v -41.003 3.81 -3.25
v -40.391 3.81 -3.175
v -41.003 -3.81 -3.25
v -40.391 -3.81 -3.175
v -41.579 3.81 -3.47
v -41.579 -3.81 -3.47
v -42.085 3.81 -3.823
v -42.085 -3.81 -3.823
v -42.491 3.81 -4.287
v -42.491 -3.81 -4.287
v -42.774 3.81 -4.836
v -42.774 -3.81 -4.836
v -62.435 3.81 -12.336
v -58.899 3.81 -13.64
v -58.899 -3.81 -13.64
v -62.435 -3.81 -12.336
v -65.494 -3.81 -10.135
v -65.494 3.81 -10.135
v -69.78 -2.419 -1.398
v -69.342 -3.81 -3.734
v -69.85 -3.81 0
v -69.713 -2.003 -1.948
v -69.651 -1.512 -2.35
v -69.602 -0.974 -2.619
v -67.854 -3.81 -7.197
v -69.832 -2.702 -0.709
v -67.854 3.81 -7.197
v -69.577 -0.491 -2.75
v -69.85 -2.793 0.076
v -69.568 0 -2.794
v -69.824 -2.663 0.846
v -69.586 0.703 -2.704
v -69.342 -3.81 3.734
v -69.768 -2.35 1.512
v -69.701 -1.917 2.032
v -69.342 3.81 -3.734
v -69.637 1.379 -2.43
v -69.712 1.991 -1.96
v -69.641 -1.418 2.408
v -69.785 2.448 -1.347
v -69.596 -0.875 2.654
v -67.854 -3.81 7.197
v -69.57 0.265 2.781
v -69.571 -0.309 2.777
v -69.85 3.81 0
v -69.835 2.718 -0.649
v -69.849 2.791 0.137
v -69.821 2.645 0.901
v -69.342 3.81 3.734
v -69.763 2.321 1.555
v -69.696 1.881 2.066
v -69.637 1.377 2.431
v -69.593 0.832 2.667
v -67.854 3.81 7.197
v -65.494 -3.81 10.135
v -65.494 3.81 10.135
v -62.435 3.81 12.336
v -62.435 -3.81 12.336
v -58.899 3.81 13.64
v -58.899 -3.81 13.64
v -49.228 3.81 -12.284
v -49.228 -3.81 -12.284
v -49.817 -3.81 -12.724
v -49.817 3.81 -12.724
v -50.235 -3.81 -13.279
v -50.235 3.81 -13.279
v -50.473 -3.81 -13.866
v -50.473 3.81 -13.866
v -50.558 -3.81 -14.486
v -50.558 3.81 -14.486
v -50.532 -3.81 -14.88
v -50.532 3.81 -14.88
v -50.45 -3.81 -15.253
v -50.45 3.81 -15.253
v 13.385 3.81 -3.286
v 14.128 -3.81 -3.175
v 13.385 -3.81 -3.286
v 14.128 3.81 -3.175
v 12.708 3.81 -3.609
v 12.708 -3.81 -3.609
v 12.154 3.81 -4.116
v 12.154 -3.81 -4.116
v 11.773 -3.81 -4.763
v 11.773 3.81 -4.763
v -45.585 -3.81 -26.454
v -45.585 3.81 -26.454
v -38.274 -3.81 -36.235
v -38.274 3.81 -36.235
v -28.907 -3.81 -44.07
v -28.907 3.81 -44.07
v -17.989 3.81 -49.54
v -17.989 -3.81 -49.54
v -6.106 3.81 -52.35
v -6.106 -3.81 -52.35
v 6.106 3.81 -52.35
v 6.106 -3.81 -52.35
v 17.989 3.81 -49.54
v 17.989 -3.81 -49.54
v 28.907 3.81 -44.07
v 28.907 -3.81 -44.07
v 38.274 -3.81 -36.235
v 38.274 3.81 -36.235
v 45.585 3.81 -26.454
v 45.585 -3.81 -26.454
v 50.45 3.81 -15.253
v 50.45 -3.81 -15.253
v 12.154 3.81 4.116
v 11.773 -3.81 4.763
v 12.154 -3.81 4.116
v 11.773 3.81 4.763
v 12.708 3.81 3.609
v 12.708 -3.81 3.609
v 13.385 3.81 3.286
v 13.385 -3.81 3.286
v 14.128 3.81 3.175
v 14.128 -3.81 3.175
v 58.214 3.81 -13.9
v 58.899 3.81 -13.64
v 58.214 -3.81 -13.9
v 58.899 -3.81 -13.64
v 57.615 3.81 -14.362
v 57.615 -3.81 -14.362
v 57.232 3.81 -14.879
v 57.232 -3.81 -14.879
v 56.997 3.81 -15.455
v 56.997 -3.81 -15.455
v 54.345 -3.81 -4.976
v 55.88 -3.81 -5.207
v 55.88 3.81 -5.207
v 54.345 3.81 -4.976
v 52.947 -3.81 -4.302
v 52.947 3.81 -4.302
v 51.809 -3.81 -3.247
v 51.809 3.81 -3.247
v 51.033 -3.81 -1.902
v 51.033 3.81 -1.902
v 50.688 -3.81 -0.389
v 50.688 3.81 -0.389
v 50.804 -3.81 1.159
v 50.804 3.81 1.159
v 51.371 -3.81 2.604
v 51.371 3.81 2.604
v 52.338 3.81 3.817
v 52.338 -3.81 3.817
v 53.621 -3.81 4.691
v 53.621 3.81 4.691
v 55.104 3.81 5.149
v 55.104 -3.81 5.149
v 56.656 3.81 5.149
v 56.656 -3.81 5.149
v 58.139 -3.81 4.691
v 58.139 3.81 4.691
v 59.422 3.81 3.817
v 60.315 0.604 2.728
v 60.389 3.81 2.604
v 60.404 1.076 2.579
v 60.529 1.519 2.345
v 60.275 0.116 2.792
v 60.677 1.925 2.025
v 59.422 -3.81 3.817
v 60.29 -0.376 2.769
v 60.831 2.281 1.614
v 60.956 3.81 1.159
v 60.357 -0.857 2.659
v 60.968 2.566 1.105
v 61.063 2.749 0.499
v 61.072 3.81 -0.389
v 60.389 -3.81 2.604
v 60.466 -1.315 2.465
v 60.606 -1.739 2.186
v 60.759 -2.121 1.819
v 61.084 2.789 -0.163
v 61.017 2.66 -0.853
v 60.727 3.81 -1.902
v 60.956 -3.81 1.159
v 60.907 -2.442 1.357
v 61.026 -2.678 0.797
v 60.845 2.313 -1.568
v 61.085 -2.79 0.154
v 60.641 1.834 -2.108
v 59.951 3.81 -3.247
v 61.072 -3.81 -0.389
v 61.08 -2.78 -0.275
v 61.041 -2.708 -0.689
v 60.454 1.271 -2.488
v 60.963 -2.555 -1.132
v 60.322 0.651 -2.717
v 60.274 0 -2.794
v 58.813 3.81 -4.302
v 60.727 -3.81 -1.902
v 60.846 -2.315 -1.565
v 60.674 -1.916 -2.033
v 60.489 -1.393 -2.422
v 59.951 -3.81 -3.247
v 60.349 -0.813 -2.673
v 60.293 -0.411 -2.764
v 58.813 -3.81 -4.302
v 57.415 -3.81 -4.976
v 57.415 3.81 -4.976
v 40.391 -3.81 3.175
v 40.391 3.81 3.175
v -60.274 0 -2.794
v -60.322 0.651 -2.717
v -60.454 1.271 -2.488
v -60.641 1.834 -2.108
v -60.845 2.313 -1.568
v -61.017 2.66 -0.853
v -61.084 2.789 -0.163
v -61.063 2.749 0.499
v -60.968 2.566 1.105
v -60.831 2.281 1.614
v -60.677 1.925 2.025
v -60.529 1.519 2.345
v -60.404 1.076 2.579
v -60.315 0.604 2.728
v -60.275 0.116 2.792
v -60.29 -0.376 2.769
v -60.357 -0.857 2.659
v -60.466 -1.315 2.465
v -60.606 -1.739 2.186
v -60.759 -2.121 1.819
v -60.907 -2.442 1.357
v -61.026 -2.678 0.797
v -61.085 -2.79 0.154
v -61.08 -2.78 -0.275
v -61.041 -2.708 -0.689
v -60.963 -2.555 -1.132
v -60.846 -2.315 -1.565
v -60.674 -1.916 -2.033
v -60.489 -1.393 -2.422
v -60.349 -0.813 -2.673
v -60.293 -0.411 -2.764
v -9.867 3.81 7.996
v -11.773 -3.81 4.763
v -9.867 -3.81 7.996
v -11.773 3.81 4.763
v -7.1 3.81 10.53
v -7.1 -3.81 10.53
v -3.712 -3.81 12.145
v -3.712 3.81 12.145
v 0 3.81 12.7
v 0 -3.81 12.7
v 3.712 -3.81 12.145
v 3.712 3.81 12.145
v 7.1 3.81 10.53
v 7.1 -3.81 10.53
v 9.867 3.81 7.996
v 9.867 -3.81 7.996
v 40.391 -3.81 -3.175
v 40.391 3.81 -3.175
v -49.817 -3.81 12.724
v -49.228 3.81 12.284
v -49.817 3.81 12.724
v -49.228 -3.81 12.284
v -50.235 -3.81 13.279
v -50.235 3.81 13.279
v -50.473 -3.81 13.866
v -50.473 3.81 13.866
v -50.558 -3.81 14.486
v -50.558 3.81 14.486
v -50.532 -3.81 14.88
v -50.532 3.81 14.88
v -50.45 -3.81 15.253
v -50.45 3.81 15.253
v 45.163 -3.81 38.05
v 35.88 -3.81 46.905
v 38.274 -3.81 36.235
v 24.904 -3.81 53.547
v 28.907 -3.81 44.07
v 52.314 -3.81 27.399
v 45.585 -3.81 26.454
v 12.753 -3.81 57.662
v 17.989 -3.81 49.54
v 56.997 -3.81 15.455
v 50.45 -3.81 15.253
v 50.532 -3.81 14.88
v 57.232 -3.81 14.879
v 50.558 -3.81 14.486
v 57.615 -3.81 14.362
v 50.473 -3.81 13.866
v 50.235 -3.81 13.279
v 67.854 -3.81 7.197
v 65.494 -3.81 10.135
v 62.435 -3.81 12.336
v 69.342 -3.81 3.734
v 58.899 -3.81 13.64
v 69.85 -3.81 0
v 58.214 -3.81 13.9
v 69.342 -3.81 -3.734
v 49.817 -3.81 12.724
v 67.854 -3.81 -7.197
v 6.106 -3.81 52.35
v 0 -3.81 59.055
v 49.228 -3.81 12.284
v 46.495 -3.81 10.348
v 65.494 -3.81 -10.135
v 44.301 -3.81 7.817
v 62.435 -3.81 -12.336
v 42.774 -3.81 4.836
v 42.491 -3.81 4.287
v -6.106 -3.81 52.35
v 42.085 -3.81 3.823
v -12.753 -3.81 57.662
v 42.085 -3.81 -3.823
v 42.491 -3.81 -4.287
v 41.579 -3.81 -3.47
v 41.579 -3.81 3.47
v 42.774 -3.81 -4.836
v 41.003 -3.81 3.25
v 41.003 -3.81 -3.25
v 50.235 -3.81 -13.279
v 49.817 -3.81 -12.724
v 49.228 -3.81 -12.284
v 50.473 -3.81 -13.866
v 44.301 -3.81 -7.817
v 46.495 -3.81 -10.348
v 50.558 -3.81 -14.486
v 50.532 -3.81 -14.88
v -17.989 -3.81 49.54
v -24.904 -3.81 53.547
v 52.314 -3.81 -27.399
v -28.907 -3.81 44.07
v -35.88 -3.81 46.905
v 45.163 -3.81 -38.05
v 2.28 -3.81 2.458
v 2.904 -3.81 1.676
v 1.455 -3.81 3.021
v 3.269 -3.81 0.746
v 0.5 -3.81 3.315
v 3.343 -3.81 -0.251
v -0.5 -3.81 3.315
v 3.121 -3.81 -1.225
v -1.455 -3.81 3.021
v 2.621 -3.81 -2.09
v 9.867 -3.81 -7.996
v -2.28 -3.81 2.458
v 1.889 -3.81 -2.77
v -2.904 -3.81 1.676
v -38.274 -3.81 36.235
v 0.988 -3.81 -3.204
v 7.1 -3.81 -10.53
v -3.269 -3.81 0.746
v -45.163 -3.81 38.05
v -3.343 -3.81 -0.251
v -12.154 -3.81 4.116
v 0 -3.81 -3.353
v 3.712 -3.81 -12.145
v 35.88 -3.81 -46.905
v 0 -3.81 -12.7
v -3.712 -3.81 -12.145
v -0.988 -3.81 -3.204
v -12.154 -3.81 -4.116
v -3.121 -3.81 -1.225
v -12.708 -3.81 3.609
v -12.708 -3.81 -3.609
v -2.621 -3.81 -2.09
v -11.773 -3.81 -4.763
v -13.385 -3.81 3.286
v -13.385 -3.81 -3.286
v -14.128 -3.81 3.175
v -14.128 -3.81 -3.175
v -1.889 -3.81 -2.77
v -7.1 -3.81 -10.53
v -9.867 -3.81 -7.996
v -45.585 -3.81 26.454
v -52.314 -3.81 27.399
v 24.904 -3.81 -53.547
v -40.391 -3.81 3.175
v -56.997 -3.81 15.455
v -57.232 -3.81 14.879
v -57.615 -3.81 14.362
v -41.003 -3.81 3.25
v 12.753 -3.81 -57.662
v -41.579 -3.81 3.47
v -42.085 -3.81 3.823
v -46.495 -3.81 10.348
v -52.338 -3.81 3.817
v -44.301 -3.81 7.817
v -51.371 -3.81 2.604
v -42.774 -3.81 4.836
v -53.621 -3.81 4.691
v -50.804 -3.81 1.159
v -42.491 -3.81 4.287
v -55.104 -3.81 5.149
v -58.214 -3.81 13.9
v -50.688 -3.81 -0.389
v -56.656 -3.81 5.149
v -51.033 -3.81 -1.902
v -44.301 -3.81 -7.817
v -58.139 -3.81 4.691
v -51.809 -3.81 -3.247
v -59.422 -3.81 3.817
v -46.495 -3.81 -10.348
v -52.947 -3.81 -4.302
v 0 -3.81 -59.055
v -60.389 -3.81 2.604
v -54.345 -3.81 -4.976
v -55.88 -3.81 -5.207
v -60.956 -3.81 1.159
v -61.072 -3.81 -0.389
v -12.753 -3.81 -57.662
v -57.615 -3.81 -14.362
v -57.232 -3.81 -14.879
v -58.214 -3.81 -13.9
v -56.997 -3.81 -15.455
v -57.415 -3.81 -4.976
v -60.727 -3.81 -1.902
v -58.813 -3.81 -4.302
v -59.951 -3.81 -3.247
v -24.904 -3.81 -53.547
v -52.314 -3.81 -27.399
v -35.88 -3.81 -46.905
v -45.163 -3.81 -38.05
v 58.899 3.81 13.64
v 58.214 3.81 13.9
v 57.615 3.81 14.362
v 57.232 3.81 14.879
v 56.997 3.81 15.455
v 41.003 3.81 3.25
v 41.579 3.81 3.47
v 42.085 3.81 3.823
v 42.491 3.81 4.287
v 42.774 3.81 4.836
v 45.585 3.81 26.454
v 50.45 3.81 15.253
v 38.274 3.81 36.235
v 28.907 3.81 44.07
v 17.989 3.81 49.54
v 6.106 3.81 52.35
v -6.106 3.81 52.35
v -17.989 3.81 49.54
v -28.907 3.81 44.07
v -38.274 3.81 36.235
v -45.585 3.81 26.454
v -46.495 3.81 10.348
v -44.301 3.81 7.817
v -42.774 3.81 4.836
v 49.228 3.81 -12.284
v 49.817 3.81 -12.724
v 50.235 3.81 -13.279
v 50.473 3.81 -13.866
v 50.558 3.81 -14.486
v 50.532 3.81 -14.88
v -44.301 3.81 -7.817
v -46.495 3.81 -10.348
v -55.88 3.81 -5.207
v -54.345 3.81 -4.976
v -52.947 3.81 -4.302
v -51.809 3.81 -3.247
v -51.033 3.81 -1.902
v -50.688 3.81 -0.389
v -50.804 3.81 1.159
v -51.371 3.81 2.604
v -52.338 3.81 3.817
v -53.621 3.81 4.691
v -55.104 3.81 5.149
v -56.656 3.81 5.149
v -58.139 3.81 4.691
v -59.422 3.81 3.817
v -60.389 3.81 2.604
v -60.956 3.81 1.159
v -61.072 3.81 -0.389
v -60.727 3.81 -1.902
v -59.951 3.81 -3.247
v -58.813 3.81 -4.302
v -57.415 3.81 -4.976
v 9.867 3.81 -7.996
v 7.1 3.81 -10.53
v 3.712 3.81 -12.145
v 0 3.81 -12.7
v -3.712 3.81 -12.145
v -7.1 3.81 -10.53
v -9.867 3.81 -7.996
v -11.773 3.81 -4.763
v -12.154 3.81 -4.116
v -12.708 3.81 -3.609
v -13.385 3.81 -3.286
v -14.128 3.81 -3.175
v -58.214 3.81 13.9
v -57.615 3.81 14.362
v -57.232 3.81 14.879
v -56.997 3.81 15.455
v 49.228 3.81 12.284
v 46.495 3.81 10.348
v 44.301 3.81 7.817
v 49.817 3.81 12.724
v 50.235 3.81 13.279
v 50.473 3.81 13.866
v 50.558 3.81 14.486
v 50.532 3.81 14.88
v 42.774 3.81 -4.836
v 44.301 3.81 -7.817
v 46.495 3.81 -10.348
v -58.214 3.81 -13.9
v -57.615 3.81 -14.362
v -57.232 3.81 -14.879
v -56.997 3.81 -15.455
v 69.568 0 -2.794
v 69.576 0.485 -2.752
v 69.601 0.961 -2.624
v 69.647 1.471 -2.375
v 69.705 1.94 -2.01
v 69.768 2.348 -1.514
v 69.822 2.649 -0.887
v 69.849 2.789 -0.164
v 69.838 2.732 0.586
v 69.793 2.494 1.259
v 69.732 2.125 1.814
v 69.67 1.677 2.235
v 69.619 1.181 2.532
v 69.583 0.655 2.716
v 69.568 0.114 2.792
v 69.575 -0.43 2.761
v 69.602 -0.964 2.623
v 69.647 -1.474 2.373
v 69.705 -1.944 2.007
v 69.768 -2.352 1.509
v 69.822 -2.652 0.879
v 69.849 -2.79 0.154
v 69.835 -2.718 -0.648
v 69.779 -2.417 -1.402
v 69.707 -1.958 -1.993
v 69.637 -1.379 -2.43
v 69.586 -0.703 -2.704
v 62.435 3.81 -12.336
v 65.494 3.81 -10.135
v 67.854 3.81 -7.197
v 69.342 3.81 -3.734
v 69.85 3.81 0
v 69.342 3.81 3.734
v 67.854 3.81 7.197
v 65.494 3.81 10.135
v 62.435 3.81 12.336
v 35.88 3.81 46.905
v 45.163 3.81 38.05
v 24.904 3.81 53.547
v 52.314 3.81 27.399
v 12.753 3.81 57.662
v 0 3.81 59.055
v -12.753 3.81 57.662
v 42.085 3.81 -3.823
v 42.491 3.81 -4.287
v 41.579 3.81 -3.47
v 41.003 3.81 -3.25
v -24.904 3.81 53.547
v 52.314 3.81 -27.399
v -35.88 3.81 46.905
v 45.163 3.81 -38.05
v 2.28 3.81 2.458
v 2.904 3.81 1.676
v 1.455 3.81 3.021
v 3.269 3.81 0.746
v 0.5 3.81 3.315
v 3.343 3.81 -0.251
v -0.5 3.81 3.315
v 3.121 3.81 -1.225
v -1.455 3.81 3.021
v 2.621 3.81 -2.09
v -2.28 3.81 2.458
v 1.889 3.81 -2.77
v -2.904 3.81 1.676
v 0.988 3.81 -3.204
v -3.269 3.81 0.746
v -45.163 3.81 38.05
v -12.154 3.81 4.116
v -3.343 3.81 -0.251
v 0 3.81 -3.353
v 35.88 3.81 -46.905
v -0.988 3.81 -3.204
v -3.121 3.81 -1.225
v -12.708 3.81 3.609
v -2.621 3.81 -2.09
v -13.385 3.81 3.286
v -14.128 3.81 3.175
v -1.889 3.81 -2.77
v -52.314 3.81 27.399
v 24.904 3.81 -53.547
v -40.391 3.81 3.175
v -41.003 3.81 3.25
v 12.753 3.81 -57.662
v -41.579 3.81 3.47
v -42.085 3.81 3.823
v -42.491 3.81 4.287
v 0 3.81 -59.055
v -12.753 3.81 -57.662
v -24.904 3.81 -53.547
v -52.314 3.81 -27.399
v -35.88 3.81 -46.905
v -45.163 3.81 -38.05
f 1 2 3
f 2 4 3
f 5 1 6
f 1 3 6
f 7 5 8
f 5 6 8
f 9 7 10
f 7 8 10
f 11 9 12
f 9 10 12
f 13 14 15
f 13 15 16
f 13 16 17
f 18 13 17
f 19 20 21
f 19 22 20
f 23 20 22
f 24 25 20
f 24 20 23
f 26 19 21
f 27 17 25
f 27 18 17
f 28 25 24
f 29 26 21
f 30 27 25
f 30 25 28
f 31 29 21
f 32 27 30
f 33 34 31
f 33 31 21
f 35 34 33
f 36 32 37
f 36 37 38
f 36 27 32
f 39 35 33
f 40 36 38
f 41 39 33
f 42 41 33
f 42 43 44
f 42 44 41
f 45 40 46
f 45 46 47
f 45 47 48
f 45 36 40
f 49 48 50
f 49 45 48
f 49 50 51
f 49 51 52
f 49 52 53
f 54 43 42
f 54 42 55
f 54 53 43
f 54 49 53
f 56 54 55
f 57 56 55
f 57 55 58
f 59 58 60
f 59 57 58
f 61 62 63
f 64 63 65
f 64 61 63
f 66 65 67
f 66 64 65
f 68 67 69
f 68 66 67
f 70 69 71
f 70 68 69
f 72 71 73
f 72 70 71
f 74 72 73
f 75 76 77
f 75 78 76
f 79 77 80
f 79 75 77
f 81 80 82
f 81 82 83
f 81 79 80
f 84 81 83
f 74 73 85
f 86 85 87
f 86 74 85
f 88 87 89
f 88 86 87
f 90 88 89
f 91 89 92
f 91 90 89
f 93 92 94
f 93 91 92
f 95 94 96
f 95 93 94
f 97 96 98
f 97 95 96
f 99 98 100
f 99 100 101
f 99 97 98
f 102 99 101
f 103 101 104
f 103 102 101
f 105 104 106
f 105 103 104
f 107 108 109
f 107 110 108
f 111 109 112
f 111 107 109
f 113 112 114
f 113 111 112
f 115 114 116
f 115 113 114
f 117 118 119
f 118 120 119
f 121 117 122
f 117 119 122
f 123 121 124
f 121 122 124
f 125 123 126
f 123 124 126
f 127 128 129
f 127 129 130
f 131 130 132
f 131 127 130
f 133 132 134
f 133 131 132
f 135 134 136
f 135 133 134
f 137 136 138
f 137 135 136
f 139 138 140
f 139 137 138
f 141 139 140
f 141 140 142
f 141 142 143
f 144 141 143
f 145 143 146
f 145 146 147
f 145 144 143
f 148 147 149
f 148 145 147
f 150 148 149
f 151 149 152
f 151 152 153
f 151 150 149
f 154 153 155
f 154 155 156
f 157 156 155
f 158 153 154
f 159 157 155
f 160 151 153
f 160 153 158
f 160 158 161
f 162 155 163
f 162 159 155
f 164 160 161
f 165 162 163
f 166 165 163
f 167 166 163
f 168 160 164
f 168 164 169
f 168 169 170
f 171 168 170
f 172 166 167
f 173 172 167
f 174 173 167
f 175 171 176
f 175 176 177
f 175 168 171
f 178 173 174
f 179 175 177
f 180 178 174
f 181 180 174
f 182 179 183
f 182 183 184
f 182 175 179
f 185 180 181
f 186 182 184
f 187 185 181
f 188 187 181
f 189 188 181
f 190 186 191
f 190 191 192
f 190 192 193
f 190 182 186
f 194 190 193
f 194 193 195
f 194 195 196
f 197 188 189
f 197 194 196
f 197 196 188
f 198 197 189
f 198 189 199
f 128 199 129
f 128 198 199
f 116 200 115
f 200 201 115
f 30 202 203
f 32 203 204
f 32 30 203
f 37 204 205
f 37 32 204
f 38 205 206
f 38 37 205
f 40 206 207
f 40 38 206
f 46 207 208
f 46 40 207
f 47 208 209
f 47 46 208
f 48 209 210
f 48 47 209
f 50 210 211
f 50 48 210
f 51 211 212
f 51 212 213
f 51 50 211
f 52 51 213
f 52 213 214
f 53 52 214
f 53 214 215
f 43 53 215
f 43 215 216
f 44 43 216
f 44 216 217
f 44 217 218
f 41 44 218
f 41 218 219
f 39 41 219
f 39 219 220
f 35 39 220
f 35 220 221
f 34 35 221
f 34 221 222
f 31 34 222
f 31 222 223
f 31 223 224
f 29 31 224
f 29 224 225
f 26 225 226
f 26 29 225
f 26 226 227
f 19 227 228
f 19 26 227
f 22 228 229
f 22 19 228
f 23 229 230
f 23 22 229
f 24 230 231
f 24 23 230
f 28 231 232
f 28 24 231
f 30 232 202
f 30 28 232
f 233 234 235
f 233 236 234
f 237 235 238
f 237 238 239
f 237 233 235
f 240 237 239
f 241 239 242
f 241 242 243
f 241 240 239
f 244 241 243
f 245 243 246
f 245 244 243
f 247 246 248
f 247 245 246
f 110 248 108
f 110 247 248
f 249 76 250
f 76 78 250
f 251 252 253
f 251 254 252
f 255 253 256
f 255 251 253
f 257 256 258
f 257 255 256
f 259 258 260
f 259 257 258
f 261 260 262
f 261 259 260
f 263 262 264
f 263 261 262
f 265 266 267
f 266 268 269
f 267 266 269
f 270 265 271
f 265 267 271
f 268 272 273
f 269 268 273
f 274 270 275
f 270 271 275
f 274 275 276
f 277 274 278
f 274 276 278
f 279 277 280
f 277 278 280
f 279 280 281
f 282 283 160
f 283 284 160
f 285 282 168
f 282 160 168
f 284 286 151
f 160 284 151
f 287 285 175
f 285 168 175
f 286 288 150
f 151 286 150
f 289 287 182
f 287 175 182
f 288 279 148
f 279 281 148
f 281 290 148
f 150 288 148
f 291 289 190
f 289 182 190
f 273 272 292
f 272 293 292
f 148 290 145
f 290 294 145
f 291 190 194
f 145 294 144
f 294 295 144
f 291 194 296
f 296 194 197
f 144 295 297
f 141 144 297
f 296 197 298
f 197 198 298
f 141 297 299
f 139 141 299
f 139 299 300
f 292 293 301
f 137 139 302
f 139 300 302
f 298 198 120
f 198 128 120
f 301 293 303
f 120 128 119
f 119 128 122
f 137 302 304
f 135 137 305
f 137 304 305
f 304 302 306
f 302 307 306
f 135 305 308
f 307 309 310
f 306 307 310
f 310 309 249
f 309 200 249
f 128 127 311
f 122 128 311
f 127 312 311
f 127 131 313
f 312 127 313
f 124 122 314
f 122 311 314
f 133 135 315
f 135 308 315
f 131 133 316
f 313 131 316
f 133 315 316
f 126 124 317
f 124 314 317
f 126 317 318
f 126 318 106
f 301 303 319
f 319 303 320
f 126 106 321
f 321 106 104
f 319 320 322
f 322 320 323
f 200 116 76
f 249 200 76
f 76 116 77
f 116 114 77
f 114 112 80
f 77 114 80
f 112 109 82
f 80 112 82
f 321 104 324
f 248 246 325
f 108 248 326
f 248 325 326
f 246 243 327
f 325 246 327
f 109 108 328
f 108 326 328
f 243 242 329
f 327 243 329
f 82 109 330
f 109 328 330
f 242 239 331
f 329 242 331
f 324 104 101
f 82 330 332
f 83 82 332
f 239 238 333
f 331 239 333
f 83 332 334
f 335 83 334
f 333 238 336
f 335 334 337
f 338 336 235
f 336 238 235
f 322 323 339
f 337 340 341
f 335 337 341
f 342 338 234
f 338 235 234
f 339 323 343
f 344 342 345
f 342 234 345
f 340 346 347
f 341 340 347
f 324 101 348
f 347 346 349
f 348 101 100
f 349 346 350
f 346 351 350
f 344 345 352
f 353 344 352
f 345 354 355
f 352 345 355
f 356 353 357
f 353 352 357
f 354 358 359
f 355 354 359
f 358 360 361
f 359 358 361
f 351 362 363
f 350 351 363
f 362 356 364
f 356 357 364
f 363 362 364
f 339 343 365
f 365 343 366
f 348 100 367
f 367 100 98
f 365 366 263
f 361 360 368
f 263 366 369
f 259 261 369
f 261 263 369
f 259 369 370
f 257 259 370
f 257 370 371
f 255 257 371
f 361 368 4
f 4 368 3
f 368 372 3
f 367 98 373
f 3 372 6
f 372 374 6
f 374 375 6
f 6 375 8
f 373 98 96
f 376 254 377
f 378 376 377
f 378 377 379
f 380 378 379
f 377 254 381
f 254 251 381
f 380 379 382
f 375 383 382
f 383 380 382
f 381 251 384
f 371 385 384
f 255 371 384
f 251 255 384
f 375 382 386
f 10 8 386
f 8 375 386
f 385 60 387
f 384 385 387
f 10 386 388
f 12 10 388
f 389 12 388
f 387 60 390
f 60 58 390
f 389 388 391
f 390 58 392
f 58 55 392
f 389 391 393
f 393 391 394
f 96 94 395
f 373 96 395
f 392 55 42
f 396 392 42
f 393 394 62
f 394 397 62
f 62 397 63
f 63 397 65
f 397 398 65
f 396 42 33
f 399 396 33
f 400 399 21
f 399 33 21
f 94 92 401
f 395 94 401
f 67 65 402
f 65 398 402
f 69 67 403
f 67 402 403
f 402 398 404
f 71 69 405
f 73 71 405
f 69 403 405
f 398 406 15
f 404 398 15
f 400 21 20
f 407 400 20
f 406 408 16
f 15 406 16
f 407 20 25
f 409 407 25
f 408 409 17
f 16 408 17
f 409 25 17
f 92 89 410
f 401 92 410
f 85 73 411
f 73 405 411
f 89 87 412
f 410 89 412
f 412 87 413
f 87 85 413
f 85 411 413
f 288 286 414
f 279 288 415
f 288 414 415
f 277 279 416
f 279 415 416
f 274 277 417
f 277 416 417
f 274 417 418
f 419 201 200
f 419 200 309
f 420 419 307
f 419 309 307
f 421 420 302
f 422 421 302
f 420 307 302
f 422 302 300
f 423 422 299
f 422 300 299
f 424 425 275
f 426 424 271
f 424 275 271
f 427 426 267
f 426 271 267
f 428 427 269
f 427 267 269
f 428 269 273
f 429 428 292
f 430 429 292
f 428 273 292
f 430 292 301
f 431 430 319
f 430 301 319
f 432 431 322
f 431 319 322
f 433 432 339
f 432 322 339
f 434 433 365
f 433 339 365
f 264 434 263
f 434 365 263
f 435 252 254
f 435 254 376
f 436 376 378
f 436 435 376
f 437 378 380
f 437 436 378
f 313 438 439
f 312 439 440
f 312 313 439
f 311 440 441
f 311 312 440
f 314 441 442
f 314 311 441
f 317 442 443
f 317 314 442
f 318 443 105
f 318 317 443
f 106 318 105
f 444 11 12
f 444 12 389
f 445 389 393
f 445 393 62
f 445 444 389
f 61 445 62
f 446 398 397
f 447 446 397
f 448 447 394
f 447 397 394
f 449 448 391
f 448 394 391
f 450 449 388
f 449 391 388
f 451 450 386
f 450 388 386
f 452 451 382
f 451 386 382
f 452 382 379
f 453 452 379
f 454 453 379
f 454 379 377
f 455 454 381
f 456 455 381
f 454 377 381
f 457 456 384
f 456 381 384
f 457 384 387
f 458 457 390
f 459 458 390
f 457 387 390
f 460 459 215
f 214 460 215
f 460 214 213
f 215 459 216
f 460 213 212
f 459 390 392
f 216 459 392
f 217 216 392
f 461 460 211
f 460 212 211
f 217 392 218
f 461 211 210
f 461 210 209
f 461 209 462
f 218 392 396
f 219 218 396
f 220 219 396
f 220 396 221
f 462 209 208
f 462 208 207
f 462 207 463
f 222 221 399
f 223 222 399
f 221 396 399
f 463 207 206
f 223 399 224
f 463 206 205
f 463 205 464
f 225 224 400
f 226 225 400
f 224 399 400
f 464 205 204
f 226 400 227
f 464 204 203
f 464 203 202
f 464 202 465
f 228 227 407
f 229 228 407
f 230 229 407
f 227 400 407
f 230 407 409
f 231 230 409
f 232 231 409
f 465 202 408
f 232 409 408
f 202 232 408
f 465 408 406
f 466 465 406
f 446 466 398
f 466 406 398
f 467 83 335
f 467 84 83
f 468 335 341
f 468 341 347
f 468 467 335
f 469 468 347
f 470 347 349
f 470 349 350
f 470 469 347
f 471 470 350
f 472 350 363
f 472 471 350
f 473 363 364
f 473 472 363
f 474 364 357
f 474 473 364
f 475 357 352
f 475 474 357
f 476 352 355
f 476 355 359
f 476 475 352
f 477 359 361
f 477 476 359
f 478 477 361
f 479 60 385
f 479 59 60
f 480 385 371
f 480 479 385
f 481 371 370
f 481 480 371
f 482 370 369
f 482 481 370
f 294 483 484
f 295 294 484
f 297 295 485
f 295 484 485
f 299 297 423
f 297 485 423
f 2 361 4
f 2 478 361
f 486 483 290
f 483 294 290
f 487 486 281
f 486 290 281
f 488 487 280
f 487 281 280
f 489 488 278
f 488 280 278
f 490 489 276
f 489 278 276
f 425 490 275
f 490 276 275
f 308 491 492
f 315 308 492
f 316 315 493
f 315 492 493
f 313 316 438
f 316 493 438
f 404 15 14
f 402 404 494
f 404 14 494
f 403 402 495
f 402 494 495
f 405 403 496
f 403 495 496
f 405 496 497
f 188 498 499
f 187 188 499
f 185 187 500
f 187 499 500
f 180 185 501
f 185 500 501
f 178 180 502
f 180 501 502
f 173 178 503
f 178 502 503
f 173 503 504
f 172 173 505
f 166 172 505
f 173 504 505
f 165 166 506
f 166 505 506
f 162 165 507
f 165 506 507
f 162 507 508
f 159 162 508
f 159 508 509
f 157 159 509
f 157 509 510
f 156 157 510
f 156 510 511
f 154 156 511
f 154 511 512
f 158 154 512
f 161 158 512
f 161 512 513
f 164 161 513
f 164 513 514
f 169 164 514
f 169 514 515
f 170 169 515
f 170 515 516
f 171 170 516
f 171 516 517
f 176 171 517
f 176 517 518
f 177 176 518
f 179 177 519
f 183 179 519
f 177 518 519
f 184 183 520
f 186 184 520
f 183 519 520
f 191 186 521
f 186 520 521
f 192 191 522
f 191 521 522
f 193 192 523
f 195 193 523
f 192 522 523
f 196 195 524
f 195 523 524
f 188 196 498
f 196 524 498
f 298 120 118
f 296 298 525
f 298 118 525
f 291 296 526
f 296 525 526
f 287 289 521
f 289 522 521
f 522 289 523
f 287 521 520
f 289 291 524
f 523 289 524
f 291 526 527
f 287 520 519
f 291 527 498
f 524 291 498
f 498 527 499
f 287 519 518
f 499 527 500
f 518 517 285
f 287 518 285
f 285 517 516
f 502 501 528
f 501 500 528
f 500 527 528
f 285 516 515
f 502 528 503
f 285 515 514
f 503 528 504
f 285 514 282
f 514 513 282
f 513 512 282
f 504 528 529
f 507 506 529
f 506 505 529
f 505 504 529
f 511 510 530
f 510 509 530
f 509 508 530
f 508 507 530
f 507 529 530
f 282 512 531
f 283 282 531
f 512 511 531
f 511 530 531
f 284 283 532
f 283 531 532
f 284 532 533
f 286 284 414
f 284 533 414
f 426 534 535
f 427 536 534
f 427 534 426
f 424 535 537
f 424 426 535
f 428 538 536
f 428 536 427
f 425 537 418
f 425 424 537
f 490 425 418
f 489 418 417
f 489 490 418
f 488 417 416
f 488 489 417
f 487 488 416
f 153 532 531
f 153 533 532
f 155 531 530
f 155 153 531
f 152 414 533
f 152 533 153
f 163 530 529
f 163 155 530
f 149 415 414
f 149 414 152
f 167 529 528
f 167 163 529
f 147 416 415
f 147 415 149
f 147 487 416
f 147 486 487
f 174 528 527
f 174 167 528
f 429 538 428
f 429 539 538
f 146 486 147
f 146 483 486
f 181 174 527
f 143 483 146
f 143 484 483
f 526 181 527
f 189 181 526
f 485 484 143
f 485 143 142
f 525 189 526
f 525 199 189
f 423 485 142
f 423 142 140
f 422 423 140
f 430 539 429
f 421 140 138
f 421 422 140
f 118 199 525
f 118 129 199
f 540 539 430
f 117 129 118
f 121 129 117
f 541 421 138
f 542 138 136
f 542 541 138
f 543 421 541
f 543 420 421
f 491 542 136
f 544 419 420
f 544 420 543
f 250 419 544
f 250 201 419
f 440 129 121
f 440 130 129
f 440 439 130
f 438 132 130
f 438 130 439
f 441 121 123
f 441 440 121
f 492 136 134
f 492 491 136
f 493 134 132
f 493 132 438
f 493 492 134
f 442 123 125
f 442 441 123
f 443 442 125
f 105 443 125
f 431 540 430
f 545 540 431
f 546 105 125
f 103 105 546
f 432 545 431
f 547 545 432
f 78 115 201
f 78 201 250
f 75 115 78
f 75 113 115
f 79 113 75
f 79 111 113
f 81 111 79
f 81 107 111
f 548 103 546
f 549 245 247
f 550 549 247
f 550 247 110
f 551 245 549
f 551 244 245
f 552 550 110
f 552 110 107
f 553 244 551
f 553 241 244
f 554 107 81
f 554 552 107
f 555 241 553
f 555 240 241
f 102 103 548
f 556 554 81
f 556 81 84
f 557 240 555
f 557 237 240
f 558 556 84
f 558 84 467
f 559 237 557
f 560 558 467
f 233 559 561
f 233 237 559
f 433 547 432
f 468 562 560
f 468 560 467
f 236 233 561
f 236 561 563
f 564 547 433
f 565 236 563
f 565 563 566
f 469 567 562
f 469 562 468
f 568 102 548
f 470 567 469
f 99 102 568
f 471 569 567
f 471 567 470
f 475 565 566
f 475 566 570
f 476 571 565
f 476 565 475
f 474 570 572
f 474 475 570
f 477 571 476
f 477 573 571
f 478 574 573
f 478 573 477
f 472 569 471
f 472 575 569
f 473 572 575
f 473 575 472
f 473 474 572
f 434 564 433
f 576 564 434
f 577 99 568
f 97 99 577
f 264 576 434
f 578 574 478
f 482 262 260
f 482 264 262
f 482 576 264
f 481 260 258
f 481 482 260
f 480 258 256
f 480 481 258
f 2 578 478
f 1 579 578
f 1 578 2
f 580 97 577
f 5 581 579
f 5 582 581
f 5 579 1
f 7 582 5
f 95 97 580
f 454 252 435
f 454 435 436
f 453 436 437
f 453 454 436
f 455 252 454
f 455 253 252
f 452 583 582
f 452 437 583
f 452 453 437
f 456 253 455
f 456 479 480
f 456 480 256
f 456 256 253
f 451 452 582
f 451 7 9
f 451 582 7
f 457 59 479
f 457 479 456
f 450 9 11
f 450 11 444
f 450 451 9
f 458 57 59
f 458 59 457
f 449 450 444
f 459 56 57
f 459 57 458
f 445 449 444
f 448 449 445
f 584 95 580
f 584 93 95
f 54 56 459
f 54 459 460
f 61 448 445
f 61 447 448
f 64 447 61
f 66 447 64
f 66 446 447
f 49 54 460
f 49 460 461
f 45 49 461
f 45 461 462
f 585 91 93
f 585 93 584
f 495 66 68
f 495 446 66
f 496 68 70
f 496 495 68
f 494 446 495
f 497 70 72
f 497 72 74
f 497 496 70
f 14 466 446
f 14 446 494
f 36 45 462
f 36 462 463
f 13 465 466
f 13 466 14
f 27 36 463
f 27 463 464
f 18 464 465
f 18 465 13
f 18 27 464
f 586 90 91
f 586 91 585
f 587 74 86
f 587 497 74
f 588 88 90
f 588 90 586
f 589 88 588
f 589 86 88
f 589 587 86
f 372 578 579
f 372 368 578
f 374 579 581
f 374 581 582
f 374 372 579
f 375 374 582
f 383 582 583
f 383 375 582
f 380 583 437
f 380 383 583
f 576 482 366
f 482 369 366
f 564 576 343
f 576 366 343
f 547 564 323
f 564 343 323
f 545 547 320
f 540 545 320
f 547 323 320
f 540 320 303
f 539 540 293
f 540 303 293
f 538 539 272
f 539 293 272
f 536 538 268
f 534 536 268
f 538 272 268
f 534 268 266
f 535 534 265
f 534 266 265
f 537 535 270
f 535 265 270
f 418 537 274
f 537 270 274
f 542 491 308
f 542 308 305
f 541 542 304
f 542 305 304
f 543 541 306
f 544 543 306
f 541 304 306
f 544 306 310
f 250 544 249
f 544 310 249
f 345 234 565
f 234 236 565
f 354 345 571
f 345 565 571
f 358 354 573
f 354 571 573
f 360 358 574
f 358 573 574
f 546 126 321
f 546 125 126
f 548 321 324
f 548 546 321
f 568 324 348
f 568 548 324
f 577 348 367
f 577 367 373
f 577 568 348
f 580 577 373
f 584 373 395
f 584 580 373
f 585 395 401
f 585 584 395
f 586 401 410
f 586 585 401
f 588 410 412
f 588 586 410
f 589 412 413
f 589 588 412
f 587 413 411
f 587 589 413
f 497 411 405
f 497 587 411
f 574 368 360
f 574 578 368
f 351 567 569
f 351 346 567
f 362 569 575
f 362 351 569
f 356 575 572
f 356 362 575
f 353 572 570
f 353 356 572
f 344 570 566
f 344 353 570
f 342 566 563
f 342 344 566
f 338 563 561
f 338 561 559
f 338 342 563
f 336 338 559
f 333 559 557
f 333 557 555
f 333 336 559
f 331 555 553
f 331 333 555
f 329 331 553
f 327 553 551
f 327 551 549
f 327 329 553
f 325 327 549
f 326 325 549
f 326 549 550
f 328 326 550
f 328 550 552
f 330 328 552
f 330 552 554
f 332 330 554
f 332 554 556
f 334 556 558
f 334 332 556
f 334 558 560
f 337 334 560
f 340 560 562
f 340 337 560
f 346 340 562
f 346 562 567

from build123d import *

# Parameters (mm, degrees)
SKETCH1_R               = 12.7
SKETCH1_R_2             = 3.3528
BOSS_EXTRUDE1_DEPTH     = 3.81
SKETCH2_R               = 5.207
BOSS_EXTRUDE2_DEPTH     = 3.81
CUT_EXTRUDE1_REACH      = 85.81
CUT_EXTRUDE1_END_RADIUS = 5.207
SKETCH3_R               = 2.794
BOSS_EXTRUDE3_DEPTH     = 3.81
FILLET1_R               = 2.54


with BuildPart() as part:
    # Sketch1 → Boss-Extrude1 (new, symmetric)
    with BuildSketch(Plane(origin=(0, 0, 0), x_dir=(1, 0, 0), z_dir=(0, 1, 0))):
        with Locations(Location((0, 0, 0), (0, 0, 90))):
            Circle(SKETCH1_R)
        with Locations(Location((0, 0, 0), (0, 0, 90))):
            Circle(SKETCH1_R_2, mode=Mode.SUBTRACT)
    extrude(amount=BOSS_EXTRUDE1_DEPTH, both=True)

    # Sketch2 → Boss-Extrude2 (add, symmetric)
    with BuildSketch(Plane(origin=(0, 0, 0), x_dir=(1, 0, 0), z_dir=(0, 1, 0))):
        with BuildLine():
            Line((12.296722124, 3.175), (42.275578844, 3.175))
            ThreePointArc((42.275578844, 3.175), (69.85, 0), (42.275578844, -3.175))
            Line((42.275578844, -3.175), (12.296722124, -3.175))
            ThreePointArc((12.296722124, -3.175), (12.7, 0), (12.296722124, 3.175))
        make_face()
        with Locations(Location((55.88, 0, 0), (0, 0, 90))):
            Circle(SKETCH2_R, mode=Mode.SUBTRACT)
    boss_extrude2 = extrude(amount=BOSS_EXTRUDE2_DEPTH, both=True)

    # Cut-Extrude1: up to this cylinder (the profile starts outside it)
    cut_extrude1_end = Plane(origin=(55.88, 0, 0), z_dir=(0, -1, 0)) * Cylinder(CUT_EXTRUDE1_END_RADIUS, 183.034, mode=Mode.PRIVATE)
    # Sketch3 → Cut-Extrude1 (cut, up to the surface)
    with BuildSketch(Plane(origin=(69.85, 0, 0), x_dir=(0, 0, -1), z_dir=(1, 0, 0)), mode=Mode.PRIVATE) as cut_extrude1_sk1:
        Circle(SKETCH3_R)
    cut_extrude1_tool1 = extrude(cut_extrude1_sk1.sketch, amount=-CUT_EXTRUDE1_REACH, mode=Mode.PRIVATE) - cut_extrude1_end
    cut_extrude1 = cut_extrude1_tool1.solids().sort_by_distance((69.85, 0, 0))[0]
    add(cut_extrude1, mode=Mode.SUBTRACT)

    # Mirror1: Boss-Extrude2, Cut-Extrude1 across plane
    add(boss_extrude2.mirror(Plane(origin=(0, 0, 0), x_dir=(0, 0, 1), z_dir=(1, 0, 0))))
    add(cut_extrude1.mirror(Plane(origin=(0, 0, 0), x_dir=(0, 0, 1), z_dir=(1, 0, 0))), mode=Mode.SUBTRACT)

    # Sketch4 → Boss-Extrude3 (add, symmetric)
    with BuildSketch(Plane(origin=(0, 0, 0), x_dir=(1, 0, 0), z_dir=(0, 1, 0))):
        with BuildLine():
            ThreePointArc((-51.048948864, -13.10808319), (-54.178749787, -13.866024943), (-57.398948864, -13.887177336))
            ThreePointArc((-57.398948864, -13.887177336), (0, -59.055), (57.398948864, -13.887177336))
            ThreePointArc((57.398948864, -13.887177336), (54.178749787, -13.866024943), (51.048948864, -13.10808319))
            ThreePointArc((51.048948864, -13.10808319), (0, -52.705), (-51.048948864, -13.10808319))
        make_face()
        with BuildLine():
            ThreePointArc((57.398948864, 13.887177336), (0, 59.055), (-57.398948864, 13.887177336))
            ThreePointArc((-57.398948864, 13.887177336), (-54.178749787, 13.866024943), (-51.048948864, 13.10808319))
            ThreePointArc((-51.048948864, 13.10808319), (0, 52.705), (51.048948864, 13.10808319))
            ThreePointArc((51.048948864, 13.10808319), (54.178749787, 13.866024943), (57.398948864, 13.887177336))
        make_face()
    extrude(amount=BOSS_EXTRUDE3_DEPTH, both=True)

    # Fillet1
    fillet1_edges = [part.edges().sort_by_distance(p)[0] for p in [
        (12.296722124, 0, -3.175),
        (12.296722124, 0, 3.175),
        (42.275578844, 0, 3.175),
        (42.275578844, 0, -3.175),
        (-12.296722124, 0, 3.175),
        (-12.296722124, 0, -3.175),
        (-42.275578844, 0, -3.175),
        (-42.275578844, 0, 3.175),
        (-51.048948864, 0, 13.10808319),
        (-57.398948864, 0, 13.887177336),
        (57.398948864, 0, 13.887177336),
        (51.048948864, 0, 13.10808319),
        (51.048948864, 0, -13.10808319),
        (57.398948864, 0, -13.887177336),
        (-57.398948864, 0, -13.887177336),
        (-51.048948864, 0, -13.10808319),
    ]]
    fillet(fillet1_edges, radius=FILLET1_R)


solid = part.part
